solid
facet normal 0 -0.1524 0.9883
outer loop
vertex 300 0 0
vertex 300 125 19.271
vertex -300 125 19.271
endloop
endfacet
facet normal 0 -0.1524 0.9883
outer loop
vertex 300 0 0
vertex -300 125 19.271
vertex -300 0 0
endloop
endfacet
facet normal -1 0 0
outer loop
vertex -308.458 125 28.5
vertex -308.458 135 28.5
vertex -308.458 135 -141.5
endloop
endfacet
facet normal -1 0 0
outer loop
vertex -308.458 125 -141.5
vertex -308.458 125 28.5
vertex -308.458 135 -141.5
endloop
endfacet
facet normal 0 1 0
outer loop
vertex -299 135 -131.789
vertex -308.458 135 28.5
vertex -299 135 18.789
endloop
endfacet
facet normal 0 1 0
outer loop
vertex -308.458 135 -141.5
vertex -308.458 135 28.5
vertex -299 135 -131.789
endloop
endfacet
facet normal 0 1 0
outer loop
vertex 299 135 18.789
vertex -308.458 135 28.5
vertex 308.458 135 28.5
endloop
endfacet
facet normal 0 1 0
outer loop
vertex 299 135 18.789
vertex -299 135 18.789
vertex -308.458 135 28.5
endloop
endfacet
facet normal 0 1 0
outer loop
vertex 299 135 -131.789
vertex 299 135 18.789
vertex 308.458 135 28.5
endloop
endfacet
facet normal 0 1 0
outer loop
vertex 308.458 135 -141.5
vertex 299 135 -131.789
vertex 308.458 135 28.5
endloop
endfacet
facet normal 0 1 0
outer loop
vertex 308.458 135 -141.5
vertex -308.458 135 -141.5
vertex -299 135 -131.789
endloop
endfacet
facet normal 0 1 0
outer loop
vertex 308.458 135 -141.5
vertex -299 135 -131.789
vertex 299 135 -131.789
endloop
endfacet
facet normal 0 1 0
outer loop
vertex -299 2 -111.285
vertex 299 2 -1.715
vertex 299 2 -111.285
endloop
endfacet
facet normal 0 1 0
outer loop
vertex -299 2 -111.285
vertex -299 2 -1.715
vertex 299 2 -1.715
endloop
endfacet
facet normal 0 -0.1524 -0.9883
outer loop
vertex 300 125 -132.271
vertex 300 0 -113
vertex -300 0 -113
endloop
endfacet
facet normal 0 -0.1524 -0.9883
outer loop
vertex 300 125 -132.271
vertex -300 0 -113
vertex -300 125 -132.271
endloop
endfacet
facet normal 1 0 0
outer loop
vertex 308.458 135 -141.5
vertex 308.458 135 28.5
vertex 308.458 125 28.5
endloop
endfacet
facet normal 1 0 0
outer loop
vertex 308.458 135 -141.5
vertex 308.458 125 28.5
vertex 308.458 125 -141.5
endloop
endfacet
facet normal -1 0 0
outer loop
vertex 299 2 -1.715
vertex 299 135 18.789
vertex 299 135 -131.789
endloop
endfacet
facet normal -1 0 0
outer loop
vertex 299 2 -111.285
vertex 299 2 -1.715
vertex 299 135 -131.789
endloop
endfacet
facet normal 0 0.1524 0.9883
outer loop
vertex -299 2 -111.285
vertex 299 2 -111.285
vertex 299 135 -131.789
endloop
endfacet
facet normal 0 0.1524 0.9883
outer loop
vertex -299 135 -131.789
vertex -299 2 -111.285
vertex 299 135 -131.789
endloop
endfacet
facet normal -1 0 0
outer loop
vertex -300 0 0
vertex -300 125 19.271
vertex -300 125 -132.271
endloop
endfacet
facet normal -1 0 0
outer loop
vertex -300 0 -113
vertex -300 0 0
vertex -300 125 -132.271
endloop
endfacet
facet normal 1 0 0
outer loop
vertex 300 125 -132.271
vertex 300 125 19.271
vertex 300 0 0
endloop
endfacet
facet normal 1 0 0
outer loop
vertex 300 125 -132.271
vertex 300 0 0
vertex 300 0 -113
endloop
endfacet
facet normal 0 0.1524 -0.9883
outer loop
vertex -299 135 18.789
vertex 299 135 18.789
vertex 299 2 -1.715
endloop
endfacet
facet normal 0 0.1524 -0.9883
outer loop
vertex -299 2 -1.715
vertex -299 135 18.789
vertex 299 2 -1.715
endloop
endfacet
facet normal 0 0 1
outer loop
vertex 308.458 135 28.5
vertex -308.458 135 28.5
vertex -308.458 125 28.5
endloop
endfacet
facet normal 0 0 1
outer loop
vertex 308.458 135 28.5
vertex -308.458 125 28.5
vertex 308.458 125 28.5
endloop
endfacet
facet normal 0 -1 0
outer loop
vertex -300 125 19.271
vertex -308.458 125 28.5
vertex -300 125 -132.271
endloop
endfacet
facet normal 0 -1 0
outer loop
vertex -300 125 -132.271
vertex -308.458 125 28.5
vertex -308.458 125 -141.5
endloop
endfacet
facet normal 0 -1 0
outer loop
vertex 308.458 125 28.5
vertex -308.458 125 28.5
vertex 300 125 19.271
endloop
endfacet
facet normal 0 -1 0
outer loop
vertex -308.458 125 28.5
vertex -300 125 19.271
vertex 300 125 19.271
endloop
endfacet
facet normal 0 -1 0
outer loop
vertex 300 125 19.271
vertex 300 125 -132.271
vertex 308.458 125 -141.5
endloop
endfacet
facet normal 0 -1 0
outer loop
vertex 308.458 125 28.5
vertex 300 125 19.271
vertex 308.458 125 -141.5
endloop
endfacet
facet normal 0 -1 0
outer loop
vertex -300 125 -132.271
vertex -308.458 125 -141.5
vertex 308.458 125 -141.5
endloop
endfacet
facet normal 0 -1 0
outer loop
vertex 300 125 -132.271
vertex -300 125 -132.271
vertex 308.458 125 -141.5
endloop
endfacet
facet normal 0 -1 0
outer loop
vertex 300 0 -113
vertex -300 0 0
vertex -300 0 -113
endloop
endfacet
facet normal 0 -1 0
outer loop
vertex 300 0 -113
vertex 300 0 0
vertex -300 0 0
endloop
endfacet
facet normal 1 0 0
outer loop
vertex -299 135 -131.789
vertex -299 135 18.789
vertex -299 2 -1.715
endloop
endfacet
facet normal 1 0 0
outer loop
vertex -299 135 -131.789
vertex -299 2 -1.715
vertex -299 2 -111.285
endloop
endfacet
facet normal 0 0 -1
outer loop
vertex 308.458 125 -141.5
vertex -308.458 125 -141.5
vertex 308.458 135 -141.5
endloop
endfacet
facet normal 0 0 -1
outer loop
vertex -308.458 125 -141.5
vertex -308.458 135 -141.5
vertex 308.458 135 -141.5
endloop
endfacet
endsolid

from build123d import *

# Parameters (mm, degrees)
BOSS_EXTRUDE1_DEPTH = 300
SKETCH2_W           = 616.91666666
SKETCH2_H           = 169.999999994
BOSS_EXTRUDE2_DEPTH = 5
CUT_EXTRUDE1_START  = -300
CUT_EXTRUDE1_DEPTH  = 299


with BuildPart() as part:
    # Sketch1 → Boss-Extrude1 (new, symmetric)
    with BuildSketch(Plane(origin=(0, 0, 0), x_dir=(0, 0, -1), z_dir=(1, 0, 0))):
        Polygon((0, 0), (113, 0), (133.041666667, 130), (-20.041666667, 130), align=None)
    extrude(amount=BOSS_EXTRUDE1_DEPTH, both=True)

    # Sketch2 → Boss-Extrude2 (add, symmetric)
    with BuildSketch(Plane(origin=(0, 130, 0), x_dir=(1, 0, 0), z_dir=(0, 1, 0))):
        with Locations((0, 56.5)):
            Rectangle(SKETCH2_W, SKETCH2_H)
    extrude(amount=BOSS_EXTRUDE2_DEPTH, both=True)

    # Sketch3 → Cut-Extrude1 (cut, symmetric)
    with BuildSketch(Plane.ZY.offset(300).offset(CUT_EXTRUDE1_START)):
        Polygon((-131.788872207, 135), (18.788872207, 135), (-1.71529446, 2), (-111.28470554, 2), align=None)
    extrude(amount=CUT_EXTRUDE1_DEPTH, both=True, mode=Mode.SUBTRACT)


solid = part.part
